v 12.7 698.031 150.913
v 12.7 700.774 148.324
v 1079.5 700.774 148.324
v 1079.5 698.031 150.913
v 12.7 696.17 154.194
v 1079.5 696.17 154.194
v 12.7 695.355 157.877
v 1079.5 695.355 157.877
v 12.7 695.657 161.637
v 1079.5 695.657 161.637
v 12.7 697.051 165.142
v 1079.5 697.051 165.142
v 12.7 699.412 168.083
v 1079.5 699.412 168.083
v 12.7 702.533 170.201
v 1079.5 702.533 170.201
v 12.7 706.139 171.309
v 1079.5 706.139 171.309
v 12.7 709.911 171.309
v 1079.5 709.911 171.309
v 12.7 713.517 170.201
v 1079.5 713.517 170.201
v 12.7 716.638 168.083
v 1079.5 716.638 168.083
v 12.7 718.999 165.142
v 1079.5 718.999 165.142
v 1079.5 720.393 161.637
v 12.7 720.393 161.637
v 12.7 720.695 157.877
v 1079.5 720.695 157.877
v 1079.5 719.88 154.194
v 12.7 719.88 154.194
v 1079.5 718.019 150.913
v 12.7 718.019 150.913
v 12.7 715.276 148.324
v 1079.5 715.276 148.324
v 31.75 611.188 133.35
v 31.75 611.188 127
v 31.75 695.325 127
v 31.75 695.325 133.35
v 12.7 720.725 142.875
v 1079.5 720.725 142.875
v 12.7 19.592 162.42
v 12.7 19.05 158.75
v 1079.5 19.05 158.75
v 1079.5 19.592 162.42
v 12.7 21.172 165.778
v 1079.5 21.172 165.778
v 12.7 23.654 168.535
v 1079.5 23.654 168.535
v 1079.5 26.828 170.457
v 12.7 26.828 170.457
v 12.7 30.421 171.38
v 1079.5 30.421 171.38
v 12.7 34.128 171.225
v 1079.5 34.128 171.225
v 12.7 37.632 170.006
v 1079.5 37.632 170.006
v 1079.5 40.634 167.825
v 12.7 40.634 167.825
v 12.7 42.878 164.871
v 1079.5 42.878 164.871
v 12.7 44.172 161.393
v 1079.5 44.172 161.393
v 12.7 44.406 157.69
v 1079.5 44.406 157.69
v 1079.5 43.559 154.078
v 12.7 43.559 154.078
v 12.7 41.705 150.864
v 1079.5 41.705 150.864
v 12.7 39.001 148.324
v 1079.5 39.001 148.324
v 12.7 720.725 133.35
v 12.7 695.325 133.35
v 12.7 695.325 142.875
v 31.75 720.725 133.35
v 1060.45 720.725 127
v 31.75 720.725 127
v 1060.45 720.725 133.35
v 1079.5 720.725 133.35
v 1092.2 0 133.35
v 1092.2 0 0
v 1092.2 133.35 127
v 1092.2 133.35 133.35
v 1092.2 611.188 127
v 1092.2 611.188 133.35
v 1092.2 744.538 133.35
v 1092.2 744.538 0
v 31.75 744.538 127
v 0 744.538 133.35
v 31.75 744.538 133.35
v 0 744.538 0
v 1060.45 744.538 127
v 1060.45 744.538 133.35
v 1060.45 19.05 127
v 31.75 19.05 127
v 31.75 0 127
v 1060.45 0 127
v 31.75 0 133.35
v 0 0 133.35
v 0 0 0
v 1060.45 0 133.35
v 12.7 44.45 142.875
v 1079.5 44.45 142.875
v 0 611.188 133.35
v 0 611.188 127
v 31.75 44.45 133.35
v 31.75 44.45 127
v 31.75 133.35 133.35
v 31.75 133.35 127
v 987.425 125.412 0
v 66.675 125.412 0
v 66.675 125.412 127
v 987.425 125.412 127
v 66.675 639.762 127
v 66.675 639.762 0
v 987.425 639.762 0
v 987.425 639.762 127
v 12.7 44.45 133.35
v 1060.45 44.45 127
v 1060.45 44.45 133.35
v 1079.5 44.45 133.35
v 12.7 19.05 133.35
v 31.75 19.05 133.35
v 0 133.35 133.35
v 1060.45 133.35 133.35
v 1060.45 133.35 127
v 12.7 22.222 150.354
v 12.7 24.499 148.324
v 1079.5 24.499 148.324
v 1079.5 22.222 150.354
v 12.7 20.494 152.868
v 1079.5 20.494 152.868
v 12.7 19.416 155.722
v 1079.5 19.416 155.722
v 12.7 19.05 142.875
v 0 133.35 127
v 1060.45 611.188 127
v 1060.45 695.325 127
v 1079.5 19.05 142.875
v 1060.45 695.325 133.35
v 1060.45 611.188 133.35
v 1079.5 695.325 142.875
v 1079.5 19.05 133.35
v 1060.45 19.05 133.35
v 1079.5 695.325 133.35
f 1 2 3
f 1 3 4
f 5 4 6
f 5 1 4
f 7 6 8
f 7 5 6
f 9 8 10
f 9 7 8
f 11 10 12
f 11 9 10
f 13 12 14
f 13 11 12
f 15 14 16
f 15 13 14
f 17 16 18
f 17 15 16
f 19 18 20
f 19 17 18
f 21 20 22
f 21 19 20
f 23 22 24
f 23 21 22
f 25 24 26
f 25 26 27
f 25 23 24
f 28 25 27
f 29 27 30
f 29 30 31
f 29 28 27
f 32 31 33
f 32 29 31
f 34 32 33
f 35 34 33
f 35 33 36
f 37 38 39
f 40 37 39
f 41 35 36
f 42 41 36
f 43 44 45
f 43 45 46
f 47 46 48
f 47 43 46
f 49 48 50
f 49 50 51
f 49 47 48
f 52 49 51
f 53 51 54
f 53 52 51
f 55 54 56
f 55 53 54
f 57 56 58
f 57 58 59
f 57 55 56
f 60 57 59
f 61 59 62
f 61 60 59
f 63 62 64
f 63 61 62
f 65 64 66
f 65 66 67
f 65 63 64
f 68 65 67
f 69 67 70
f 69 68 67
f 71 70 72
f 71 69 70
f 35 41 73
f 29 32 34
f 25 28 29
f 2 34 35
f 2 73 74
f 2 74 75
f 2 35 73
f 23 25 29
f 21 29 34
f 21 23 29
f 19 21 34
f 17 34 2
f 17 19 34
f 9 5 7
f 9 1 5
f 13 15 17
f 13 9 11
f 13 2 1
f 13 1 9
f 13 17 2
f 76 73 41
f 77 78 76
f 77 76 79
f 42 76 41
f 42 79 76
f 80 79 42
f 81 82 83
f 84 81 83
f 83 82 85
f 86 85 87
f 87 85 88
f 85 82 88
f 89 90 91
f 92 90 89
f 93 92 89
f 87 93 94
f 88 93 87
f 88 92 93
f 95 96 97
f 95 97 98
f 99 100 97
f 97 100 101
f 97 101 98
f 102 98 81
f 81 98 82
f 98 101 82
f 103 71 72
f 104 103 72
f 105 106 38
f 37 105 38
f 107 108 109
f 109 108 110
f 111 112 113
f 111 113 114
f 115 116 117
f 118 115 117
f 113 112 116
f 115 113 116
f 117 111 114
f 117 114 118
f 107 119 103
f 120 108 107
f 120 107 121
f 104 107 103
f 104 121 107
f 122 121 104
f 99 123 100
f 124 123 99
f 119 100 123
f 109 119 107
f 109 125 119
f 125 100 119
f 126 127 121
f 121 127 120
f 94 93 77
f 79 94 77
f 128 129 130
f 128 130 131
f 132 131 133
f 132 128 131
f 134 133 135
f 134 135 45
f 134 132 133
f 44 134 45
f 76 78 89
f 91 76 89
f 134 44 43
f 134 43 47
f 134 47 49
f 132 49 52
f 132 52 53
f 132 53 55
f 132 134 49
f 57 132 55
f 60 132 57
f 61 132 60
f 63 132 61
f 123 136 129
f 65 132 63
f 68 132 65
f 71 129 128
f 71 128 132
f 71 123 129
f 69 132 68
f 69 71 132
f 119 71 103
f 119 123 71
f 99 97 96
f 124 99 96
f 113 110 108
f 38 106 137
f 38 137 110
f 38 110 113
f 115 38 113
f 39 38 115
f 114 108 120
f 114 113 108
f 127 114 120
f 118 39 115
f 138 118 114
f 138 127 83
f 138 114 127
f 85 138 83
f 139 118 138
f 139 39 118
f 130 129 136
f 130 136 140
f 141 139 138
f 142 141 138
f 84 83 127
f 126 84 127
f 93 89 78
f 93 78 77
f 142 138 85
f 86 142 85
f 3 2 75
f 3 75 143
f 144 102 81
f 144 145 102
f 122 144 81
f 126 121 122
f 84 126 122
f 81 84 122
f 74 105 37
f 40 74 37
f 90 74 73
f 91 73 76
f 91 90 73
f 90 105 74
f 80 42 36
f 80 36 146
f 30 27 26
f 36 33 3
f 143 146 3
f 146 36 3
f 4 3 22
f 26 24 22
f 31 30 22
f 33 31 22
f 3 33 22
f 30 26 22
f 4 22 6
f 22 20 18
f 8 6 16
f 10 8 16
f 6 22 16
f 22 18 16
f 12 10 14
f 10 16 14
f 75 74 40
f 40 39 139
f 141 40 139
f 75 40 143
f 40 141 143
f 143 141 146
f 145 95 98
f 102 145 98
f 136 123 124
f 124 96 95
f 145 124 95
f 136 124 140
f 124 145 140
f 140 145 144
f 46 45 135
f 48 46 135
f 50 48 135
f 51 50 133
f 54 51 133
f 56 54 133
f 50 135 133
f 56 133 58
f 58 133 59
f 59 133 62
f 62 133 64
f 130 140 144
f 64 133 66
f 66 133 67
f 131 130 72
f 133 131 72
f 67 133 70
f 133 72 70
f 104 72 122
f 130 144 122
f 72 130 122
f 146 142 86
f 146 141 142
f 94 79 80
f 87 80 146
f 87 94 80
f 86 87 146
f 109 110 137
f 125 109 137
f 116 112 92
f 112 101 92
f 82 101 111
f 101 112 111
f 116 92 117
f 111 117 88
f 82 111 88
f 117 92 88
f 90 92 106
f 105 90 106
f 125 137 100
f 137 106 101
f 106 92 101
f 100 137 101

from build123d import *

# Parameters (mm, degrees)
F0_W     = 1092.2
F0_H     = 744.5375
F0_W_2   = 920.75
F0_H_2   = 514.35
F1_DEPTH = 127
F2_W     = 1066.8
F2_H     = 25.4
F3_DEPTH = 25.4
F4_SIZE  = 9.525
F5_R     = 12.7
F6_DEPTH = 1066.8
F8_DEPTH = 6.35


with BuildPart() as f1:
    # F0 (on Top) → F1 (new body)
    with BuildSketch(Plane.XY):
        with Locations((546.1, 372.26875)):
            Rectangle(F0_W, F0_H)
        with Locations((527.05, 382.5875)):
            Rectangle(F0_W_2, F0_H_2, mode=Mode.SUBTRACT)
    extrude(amount=F1_DEPTH)

    # F2 (on face) → F3 (join)
    with BuildSketch(Plane.XY.offset(127)):
        with Locations((546.1, 31.75)):
            Rectangle(F2_W, F2_H)
        with Locations((546.1, 708.025)):
            Rectangle(F2_W, F2_H)
    extrude(amount=F3_DEPTH)

    # F4
    f4_edges = [f1.edges().sort_by_distance(p)[0] for p in [
        (546.1, 19.05, 152.4),
        (546.1, 44.45, 152.4),
        (546.1, 720.725, 152.4),
        (546.1, 695.325, 152.4),
    ]]
    chamfer(f4_edges, length=F4_SIZE)

    # F5 (on face) → F6 (join)
    with BuildSketch(Plane(origin=(12.7, 0, 0), x_dir=(0, -1, 0), z_dir=(-1, 0, 0))):
        with Locations((-708.025, 158.75)):
            Circle(F5_R)
        with BuildLine():
            Line((-34.925, 152.4), (-39.001326, 148.323674))
            ThreePointArc((-39.001326, 148.323674), (-31.75, 146.05), (-24.498674, 148.323674))
            Line((-24.498674, 148.323674), (-28.575, 152.4))
            Line((-28.575, 152.4), (-34.925, 152.4))
        make_face()
        with BuildLine():
            ThreePointArc((-24.498674, 148.323674), (-20.494294, 152.867902), (-19.05, 158.75))
            ThreePointArc((-19.05, 158.75), (-37.632098, 170.005706), (-39.001326, 148.323674))
            Line((-39.001326, 148.323674), (-34.925, 152.4))
            Line((-34.925, 152.4), (-28.575, 152.4))
            Line((-28.575, 152.4), (-24.498674, 148.323674))
        make_face()
    extrude(amount=-F6_DEPTH)

    # F7 (on face) → F8 (join)
    with BuildSketch(Plane.XY.offset(127)):
        Polygon((0, 0), (31.75, 0), (31.75, 19.05), (12.7, 19.05), (12.7, 44.45), (31.75, 44.45), (31.75, 133.35), (0, 133.35), align=None)
        Polygon((0, 744.5375), (0, 611.1875), (31.75, 611.1875), (31.75, 695.325), (12.7, 695.325), (12.7, 720.725), (31.75, 720.725), (31.75, 744.5375), align=None)
        Polygon((1060.45, 611.1875), (1092.2, 611.1875), (1092.2, 744.5375), (1060.45, 744.5375), (1060.45, 720.725), (1079.5, 720.725), (1079.5, 695.325), (1060.45, 695.325), align=None)
        Polygon((1060.45, 0), (1092.2, 0), (1092.2, 133.35), (1060.45, 133.35), (1060.45, 44.45), (1079.5, 44.45), (1079.5, 19.05), (1060.45, 19.05), align=None)
    extrude(amount=F8_DEPTH)


solid = f1.part
